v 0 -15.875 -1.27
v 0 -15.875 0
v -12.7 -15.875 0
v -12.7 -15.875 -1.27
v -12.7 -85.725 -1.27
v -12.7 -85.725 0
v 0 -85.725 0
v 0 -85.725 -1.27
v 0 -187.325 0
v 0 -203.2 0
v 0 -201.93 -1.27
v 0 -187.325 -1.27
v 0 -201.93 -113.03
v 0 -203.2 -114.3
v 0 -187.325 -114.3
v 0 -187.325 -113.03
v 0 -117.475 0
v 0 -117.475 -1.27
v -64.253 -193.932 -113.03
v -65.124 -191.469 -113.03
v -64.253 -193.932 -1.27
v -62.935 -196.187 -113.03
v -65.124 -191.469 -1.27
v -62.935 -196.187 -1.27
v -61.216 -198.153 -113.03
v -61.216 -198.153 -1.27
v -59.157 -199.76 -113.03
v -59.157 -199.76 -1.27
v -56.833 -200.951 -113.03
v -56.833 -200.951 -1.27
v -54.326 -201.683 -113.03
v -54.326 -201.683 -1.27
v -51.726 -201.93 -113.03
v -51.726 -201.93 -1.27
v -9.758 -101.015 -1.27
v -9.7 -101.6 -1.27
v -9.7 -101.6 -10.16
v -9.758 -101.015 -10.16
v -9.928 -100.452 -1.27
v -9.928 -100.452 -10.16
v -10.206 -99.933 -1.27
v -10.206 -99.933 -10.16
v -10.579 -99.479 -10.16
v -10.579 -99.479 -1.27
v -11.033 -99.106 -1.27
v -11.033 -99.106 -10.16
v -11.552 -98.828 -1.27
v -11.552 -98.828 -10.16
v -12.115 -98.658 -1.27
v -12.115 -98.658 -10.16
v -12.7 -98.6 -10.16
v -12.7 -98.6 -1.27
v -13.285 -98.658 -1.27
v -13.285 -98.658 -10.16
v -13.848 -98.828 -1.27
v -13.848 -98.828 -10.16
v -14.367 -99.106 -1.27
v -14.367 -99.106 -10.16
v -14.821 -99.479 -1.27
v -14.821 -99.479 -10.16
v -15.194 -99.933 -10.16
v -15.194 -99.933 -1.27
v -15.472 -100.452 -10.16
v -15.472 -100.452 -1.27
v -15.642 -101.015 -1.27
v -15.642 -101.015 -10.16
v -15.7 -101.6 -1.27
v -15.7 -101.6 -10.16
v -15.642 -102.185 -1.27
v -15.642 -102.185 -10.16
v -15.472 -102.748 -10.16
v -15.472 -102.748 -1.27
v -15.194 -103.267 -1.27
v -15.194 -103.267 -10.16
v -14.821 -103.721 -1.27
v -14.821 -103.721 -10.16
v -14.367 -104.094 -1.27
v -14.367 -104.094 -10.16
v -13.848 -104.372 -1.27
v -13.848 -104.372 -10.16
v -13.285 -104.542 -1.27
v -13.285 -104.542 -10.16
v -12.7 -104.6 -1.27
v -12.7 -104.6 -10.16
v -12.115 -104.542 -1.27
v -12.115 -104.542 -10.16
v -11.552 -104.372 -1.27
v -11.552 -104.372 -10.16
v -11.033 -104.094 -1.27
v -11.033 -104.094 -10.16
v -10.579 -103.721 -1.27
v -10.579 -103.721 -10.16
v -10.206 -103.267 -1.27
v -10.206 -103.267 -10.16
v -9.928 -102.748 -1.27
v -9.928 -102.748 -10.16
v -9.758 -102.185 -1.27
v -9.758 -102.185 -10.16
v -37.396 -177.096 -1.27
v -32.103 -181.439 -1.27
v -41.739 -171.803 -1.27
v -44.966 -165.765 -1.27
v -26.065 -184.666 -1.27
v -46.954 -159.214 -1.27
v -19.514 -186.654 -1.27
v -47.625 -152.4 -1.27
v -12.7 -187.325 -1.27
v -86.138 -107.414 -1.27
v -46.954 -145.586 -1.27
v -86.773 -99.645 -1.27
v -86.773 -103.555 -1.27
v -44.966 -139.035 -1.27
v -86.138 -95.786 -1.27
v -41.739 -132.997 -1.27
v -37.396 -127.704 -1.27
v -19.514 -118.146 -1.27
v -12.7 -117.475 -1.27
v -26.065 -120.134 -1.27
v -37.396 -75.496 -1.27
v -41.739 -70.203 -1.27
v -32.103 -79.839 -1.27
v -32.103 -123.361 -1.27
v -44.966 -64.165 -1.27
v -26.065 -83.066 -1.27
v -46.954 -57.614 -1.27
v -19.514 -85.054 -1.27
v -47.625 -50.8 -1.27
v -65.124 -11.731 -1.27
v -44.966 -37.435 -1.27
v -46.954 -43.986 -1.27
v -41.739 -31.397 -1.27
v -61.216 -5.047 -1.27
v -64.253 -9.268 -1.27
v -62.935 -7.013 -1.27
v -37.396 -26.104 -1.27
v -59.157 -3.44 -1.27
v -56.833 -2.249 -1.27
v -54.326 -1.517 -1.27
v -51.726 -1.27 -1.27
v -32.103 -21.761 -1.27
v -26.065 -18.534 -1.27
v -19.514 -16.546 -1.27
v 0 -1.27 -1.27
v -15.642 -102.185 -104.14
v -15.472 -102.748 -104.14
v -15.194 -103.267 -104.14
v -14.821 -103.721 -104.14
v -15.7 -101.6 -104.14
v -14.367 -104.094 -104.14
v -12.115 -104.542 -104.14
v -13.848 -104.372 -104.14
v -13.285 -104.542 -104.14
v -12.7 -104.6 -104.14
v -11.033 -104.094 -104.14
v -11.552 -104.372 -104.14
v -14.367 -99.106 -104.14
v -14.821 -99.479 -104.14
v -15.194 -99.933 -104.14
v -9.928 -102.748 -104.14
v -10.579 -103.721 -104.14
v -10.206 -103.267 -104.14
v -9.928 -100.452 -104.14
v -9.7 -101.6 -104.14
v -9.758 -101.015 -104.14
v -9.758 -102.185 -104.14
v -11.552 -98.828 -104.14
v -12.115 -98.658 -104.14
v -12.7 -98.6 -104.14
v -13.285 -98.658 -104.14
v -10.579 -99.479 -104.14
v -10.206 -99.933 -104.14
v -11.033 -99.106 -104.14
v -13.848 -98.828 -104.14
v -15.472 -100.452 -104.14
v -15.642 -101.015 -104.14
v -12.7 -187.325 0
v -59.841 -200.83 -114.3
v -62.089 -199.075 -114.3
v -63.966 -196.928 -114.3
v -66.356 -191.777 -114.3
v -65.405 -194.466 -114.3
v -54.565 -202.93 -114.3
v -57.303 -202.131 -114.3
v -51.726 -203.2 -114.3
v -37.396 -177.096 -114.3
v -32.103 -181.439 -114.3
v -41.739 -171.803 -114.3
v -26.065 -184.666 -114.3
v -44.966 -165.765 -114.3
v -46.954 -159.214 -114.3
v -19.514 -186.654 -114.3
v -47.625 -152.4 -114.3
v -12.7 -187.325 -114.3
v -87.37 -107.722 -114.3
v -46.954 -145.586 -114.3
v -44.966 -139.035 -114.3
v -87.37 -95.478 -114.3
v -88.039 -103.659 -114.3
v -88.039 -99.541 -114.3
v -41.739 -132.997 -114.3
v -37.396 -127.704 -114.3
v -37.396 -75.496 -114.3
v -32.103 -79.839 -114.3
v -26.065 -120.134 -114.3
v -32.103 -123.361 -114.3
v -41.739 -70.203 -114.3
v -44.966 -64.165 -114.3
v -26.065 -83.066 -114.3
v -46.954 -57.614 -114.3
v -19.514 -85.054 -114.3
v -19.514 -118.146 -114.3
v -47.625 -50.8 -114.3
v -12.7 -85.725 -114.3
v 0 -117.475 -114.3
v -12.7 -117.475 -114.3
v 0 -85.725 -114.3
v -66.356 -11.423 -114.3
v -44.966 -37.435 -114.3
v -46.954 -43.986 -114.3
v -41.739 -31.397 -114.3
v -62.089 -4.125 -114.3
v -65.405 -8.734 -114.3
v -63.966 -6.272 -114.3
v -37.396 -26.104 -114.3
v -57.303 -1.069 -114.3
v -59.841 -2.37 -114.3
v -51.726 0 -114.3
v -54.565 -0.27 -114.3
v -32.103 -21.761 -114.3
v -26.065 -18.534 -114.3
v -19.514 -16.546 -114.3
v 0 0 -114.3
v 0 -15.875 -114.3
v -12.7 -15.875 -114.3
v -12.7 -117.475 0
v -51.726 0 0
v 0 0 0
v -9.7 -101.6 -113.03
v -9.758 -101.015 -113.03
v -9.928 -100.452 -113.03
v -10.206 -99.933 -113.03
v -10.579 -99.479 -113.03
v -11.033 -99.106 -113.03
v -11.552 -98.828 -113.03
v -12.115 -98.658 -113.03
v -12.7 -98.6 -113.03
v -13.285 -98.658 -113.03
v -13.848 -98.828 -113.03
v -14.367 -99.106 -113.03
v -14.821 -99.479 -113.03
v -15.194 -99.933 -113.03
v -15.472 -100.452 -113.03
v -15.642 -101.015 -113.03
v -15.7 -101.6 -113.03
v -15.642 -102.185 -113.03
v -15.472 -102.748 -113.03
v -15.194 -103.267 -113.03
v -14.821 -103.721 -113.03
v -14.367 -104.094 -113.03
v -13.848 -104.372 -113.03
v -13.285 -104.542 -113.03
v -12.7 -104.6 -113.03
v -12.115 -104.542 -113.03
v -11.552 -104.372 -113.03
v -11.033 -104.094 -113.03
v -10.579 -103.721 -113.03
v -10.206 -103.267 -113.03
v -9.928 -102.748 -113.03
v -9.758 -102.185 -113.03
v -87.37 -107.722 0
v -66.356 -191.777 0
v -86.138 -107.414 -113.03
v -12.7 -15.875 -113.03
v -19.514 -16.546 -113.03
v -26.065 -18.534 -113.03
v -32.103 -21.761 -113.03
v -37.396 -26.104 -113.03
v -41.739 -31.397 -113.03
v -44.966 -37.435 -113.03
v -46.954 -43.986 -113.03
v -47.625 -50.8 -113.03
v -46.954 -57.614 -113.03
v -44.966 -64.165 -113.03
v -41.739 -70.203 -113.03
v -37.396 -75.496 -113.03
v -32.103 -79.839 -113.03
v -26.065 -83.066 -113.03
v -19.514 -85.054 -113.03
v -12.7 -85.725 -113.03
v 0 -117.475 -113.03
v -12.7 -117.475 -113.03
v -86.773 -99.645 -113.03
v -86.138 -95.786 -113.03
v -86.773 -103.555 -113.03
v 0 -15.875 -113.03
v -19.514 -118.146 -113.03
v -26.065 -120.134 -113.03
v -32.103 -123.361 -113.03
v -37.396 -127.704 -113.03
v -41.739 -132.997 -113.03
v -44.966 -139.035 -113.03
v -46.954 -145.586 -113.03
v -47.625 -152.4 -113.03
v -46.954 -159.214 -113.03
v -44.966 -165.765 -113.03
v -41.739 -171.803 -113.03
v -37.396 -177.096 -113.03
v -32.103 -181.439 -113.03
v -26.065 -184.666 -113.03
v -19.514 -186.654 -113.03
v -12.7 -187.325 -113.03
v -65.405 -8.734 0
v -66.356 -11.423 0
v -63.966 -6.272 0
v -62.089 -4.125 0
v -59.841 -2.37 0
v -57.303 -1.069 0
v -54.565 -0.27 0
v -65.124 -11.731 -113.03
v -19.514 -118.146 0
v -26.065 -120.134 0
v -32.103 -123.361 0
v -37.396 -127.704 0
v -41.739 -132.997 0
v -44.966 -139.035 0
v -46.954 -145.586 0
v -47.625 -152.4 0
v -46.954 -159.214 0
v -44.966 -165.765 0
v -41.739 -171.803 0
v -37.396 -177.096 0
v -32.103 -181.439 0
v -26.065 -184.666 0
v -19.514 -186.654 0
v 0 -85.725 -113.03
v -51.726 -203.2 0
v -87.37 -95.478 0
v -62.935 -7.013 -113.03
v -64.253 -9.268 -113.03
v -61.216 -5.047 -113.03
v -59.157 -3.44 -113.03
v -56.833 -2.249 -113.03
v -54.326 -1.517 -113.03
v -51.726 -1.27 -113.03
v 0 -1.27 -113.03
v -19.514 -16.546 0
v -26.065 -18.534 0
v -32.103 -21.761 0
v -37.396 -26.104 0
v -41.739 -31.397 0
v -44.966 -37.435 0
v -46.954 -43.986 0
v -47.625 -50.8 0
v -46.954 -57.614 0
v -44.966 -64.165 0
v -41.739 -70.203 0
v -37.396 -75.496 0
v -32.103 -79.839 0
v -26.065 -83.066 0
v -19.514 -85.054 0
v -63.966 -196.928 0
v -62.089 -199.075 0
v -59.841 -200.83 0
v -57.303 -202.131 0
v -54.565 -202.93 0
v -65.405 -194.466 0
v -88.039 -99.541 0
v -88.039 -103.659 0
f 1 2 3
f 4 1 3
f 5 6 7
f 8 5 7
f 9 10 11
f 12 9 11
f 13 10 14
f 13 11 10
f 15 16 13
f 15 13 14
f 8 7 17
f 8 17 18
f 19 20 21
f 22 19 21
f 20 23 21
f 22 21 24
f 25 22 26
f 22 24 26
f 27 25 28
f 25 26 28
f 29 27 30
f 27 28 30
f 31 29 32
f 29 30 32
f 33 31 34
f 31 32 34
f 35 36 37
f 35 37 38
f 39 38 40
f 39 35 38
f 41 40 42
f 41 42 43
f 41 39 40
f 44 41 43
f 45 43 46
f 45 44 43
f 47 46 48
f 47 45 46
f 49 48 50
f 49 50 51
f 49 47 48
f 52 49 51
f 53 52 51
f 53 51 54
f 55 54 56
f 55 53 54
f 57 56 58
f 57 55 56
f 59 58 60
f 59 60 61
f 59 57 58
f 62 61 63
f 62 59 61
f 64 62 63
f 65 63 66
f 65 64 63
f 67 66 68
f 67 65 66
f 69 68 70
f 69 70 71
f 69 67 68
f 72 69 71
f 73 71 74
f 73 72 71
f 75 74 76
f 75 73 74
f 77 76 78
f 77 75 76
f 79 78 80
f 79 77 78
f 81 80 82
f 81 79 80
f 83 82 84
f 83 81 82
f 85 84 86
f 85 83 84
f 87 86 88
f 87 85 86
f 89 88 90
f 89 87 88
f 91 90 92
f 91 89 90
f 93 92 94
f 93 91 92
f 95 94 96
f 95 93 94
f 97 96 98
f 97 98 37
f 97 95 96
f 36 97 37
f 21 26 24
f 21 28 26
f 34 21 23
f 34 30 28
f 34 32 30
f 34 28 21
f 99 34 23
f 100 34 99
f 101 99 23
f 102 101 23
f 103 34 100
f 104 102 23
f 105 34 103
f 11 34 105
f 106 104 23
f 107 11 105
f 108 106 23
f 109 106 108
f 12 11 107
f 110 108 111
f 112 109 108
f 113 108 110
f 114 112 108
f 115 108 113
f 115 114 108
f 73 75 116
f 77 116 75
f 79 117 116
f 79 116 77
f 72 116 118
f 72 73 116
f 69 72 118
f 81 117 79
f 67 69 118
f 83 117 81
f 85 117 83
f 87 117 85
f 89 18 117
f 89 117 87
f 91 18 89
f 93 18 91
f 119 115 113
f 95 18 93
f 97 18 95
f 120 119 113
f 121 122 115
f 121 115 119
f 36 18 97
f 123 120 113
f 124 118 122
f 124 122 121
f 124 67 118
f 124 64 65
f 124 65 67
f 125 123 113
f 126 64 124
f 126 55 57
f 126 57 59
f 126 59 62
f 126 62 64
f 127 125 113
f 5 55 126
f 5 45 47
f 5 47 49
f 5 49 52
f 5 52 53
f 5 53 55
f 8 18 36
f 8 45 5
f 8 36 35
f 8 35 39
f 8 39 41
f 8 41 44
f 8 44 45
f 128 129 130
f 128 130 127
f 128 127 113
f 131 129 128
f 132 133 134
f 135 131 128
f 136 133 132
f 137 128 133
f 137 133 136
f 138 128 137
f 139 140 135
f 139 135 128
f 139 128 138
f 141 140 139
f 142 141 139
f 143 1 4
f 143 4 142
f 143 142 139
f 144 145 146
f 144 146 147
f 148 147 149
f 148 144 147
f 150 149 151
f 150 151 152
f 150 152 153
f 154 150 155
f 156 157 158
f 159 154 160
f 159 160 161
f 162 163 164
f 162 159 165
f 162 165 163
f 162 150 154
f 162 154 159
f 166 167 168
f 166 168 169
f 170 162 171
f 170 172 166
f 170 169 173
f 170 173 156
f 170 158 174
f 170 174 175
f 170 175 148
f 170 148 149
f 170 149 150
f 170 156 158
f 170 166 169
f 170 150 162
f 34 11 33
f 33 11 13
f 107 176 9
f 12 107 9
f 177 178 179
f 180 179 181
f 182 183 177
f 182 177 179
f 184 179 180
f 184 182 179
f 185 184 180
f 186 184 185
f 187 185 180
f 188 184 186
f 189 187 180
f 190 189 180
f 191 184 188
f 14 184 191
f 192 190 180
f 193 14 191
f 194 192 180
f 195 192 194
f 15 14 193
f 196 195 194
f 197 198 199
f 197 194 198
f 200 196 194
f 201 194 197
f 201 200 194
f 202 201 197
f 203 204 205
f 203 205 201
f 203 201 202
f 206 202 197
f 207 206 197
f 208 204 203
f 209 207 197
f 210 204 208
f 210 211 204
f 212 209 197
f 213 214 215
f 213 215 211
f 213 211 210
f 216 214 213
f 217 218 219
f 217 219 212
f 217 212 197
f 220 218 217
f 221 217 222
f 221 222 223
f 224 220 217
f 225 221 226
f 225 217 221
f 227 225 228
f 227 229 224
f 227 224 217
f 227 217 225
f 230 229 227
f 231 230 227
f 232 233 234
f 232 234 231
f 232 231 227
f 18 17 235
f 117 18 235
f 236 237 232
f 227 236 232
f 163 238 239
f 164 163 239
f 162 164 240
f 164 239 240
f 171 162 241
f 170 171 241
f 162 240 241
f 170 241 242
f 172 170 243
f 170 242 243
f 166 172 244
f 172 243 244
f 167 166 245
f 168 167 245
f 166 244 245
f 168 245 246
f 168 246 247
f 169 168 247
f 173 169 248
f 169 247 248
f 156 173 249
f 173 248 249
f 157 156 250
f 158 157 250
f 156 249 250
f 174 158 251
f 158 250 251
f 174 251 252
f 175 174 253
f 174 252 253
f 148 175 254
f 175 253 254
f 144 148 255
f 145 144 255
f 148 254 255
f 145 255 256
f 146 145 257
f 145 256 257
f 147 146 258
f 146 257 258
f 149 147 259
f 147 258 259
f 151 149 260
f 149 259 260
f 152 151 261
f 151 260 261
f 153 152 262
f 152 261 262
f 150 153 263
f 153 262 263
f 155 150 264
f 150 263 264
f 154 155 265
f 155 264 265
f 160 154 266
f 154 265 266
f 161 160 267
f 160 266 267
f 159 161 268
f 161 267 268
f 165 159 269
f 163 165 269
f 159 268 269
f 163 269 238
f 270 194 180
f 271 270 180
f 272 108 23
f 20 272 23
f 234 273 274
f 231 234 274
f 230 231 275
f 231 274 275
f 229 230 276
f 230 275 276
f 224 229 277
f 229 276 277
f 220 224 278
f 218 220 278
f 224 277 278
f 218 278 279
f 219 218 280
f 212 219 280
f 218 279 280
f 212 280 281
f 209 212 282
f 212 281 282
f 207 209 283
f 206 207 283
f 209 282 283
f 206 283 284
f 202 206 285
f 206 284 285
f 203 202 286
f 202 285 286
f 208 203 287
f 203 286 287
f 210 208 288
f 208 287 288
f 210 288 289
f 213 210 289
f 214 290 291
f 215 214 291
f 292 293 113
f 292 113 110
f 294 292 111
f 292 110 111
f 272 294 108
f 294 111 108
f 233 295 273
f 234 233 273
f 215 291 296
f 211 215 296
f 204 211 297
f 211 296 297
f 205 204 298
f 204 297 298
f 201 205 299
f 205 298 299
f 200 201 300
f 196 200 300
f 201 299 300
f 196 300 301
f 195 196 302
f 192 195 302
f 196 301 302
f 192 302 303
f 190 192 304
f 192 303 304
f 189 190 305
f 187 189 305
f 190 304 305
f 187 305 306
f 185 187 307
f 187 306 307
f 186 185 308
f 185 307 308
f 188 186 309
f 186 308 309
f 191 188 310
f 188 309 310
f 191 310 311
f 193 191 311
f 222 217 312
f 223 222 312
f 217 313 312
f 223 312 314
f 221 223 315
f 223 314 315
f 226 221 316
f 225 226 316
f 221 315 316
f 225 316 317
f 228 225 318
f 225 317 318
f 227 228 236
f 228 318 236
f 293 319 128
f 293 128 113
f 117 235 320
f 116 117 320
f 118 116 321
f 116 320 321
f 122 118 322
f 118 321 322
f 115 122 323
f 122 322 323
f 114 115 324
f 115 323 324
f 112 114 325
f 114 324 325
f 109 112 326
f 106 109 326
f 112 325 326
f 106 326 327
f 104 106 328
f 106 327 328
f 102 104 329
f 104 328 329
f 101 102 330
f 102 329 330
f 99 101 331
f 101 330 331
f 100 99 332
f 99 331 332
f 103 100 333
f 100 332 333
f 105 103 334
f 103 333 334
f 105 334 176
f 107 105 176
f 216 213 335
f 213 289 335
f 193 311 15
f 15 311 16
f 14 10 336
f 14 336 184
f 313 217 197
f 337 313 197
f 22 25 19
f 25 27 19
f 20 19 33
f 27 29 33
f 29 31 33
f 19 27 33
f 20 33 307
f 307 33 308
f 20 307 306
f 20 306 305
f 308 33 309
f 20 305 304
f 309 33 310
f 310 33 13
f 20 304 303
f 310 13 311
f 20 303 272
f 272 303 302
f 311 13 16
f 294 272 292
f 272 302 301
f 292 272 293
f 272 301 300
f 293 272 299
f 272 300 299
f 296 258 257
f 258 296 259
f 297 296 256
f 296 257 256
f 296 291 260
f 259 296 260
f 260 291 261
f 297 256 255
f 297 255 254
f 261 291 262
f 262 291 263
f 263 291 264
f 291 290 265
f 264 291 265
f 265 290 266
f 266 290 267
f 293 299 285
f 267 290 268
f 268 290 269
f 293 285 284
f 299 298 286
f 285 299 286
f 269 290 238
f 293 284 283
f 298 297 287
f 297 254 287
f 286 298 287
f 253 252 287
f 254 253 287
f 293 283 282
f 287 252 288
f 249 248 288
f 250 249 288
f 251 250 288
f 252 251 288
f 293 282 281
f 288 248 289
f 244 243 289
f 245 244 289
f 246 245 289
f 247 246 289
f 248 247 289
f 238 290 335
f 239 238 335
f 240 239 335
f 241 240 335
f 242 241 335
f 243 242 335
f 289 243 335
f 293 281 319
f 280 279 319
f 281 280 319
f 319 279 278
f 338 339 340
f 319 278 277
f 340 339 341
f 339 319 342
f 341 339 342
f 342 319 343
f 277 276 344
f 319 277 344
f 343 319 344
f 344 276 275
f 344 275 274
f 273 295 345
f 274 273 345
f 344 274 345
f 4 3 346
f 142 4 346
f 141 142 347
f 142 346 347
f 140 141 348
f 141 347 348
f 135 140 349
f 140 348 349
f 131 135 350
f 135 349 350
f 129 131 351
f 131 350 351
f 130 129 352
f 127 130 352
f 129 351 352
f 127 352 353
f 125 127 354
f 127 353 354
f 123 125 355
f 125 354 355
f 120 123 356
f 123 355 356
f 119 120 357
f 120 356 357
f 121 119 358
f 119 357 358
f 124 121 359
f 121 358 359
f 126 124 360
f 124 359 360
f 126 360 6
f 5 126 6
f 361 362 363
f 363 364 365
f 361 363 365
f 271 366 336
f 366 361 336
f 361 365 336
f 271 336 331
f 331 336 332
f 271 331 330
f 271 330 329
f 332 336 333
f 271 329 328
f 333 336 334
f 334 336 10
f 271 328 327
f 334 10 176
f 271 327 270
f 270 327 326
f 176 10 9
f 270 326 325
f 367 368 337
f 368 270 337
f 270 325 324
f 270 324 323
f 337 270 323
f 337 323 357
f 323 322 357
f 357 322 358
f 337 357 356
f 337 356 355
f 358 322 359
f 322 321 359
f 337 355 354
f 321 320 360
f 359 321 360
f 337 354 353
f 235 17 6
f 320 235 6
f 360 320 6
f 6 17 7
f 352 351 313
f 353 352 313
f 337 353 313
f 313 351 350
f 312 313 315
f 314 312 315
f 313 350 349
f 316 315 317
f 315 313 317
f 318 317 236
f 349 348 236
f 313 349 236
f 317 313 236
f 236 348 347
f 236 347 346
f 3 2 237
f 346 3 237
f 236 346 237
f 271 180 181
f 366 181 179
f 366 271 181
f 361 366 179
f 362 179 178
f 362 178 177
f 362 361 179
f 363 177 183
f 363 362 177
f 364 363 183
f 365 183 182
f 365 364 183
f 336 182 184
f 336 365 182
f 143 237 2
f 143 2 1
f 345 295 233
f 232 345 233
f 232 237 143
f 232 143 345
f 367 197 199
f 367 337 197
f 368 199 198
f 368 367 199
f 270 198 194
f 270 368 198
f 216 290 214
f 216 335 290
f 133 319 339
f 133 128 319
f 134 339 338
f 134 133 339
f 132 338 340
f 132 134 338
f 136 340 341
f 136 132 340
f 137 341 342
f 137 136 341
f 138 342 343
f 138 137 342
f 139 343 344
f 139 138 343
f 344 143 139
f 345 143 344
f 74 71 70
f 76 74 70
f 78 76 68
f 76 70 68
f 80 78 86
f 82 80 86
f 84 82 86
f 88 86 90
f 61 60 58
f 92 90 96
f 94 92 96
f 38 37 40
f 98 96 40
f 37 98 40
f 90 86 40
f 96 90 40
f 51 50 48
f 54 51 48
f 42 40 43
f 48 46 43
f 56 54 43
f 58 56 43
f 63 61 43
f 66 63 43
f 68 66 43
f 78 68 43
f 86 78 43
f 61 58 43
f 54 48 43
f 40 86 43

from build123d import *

# Parameters (mm, degrees)
SKETCH1_W           = 114.3
SKETCH1_H           = 203.2
BOSS_EXTRUDE1_DEPTH = 88.9
CUT_EXTRUDE1_DEPTH  = 115.3
FILLET1_R           = 25.24
FILLET2_R           = 15.08
CUT_EXTRUDE2_DEPTH  = 115.3
LPATTERN1_COUNT     = 2
LPATTERN1_PITCH     = 101.6
SHELL5_T            = -1.27
SKETCH9_R           = 3
BOSS_EXTRUDE2_DEPTH = 8.89


with BuildPart() as part:
    # Sketch1 → Boss-Extrude1 (new body)
    with BuildSketch(Plane(origin=(0, 0, 0), x_dir=(0, 0, -1), z_dir=(1, 0, 0))):
        with Locations((57.15, -101.6)):
            Rectangle(SKETCH1_W, SKETCH1_H)
    extrude(amount=-BOSS_EXTRUDE1_DEPTH)

    # Sketch4 → Cut-Extrude1 (cut, through all)
    with BuildSketch(Plane(origin=(0, 0, -114.3), x_dir=(-1, 0, 0), z_dir=(0, 0, -1))):
        Polygon((88.9, 0), (63.5, 0), (88.9, -101.6), align=None)
        Polygon((88.9, -203.2), (88.9, -101.6), (63.5, -203.2), align=None)
    extrude(amount=-CUT_EXTRUDE1_DEPTH, mode=Mode.SUBTRACT)

    # Fillet1
    fillet1_edges = [part.edges().sort_by_distance(p)[0] for p in [
        (-88.9, -101.6, -57.15),
    ]]
    fillet(fillet1_edges, radius=FILLET1_R)

    # Fillet2
    fillet2_edges = [part.edges().sort_by_distance(p)[0] for p in [
        (-63.5, 0, -57.15),
        (-63.5, -203.2, -57.15),
    ]]
    fillet(fillet2_edges, radius=FILLET2_R)

    # Sketch5 → Cut-Extrude2 (cut, through all)
    with BuildSketch(Plane.XY):
        with BuildLine():
            Line((-12.7, -187.325), (0, -187.325))
            Line((0, -187.325), (0, -117.475))
            Line((0, -117.475), (-12.7, -117.475))
            ThreePointArc((-12.7, -117.475), (-47.625, -152.4), (-12.7, -187.325))
        make_face()
    cut_extrude2 = extrude(amount=-CUT_EXTRUDE2_DEPTH, mode=Mode.SUBTRACT)

    # LPattern1: Cut-Extrude2 ×2
    with Locations(*[(0, i * LPATTERN1_PITCH, 0) for i in range(1, LPATTERN1_COUNT)]):
        add(cut_extrude2, mode=Mode.SUBTRACT)

    # Shell5
    shell5_openings = [part.faces().sort_by_distance(p)[0] for p in [
        (0, -195.2625, -57.15),
        (0, -101.6, -57.15),
        (-30.1625, -152.4, -57.15),
        (-6.35, -117.475, -57.15),
        (-6.35, -187.325, -57.15),
        (0, -7.9375, -57.15),
        (-30.1625, -50.8, -57.15),
        (-6.35, -15.875, -57.15),
        (-6.35, -85.725, -57.15),
    ]]
    offset(amount=SHELL5_T, openings=shell5_openings, kind=Kind.INTERSECTION)

    # Sketch9 → Boss-Extrude2 (add)
    with BuildSketch(Plane.XY.offset(-113.03)):
        with Locations((-12.7, -101.6)):
            Circle(SKETCH9_R)
    boss_extrude2 = extrude(amount=BOSS_EXTRUDE2_DEPTH)

    # Mirror1: Boss-Extrude2 across plane
    add(boss_extrude2.mirror(Plane.XY.offset(-57.15)))


solid = part.part
